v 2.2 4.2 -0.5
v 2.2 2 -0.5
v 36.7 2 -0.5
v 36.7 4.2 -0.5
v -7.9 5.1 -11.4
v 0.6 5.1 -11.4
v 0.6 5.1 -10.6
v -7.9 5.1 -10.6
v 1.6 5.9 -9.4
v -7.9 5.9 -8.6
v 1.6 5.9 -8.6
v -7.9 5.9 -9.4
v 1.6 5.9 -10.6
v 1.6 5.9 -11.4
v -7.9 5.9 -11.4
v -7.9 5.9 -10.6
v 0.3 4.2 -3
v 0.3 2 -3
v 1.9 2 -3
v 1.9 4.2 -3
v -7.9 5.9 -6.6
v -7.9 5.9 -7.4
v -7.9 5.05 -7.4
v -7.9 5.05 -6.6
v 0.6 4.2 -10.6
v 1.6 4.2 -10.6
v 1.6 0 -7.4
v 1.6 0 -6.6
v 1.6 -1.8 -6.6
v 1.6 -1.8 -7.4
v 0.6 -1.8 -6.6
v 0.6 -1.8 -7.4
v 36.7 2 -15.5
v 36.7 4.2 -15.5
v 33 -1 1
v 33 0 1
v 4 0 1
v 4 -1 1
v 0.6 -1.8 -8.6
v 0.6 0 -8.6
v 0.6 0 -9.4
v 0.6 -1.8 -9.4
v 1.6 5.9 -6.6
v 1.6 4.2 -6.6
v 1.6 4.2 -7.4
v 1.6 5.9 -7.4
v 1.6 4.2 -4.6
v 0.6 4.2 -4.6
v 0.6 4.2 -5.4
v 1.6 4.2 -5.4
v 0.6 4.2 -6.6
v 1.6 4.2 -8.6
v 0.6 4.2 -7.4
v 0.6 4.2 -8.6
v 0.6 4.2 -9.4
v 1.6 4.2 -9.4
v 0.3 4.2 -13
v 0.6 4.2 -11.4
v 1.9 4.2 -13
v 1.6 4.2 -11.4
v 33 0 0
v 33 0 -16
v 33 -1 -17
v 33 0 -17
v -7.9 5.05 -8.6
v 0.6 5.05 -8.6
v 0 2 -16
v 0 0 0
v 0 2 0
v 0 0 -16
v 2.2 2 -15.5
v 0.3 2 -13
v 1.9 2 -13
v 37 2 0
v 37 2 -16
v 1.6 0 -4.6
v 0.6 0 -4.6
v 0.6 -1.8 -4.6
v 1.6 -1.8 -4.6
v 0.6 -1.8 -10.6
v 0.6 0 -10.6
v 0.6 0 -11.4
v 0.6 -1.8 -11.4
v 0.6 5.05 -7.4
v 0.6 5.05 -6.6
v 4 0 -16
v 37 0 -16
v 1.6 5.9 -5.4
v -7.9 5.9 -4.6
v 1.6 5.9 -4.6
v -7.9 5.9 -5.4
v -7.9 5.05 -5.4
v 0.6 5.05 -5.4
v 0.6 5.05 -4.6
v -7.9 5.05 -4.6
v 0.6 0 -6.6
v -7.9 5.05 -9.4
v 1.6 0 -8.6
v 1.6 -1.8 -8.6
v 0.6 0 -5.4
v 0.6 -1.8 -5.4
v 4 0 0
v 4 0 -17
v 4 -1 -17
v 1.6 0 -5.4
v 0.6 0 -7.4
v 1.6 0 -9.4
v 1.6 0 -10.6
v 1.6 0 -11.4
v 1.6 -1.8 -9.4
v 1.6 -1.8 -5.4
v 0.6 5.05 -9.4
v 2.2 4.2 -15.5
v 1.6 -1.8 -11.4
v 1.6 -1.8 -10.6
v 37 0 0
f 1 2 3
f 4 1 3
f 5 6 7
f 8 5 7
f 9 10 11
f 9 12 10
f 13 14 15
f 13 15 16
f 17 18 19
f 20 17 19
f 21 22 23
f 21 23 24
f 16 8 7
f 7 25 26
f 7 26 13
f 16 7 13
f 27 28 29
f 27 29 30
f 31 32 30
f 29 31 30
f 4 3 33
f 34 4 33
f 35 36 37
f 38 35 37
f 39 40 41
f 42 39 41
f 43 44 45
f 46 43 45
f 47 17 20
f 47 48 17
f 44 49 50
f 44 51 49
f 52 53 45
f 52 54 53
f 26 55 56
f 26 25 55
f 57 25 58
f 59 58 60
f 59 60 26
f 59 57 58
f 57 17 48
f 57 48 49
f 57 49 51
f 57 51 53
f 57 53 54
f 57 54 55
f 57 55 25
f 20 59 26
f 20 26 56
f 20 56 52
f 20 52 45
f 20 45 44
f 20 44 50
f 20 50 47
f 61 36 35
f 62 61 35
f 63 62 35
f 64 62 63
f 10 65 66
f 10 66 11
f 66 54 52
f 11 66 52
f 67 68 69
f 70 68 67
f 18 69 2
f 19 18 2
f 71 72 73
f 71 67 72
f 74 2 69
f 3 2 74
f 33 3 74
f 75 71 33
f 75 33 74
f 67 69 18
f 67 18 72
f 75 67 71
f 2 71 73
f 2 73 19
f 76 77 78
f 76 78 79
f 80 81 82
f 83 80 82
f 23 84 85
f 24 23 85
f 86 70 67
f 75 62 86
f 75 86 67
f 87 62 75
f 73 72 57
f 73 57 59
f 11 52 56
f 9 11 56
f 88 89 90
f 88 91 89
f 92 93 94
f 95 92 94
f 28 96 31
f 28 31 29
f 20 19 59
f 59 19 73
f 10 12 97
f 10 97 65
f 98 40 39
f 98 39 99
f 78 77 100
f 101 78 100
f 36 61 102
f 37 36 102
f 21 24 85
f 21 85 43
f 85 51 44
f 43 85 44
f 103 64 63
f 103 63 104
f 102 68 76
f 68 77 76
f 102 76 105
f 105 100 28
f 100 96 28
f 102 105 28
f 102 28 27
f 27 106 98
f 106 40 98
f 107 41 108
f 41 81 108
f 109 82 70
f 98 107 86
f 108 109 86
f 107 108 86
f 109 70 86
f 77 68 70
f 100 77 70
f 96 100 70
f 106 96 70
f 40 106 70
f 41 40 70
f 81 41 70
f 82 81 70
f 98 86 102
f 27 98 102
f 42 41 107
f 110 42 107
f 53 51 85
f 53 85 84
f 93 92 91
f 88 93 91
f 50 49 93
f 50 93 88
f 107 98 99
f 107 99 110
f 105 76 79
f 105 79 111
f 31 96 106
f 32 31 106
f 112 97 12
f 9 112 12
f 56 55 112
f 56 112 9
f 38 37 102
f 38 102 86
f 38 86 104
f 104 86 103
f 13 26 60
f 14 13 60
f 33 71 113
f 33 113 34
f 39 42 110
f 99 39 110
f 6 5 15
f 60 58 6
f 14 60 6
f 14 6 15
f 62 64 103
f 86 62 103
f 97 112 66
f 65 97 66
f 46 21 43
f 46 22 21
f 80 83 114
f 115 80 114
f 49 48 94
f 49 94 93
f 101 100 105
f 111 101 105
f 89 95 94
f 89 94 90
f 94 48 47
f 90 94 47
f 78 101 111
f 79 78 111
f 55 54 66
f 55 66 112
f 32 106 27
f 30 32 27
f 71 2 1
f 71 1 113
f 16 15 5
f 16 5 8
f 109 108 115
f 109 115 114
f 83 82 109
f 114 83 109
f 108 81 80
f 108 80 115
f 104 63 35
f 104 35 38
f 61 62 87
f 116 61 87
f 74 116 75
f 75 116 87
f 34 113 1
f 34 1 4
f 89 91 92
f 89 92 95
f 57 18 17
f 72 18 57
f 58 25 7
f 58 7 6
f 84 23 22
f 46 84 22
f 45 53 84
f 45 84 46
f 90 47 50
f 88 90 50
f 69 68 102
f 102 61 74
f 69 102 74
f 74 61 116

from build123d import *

# Parameters (mm, degrees)
SKETCH1_W                = 37
SKETCH1_H                = 16
BOSS_EXTRUDE1_DEPTH      = 2
SKETCH2_W                = 34.5
SKETCH2_H                = 15
BOSS_EXTRUDE2_DEPTH      = 2.2
SKETCH3_W                = 1.6
SKETCH3_H                = 10
BOSS_EXTRUDE3_DEPTH      = 2.2
SKETCH4_W                = 1
SKETCH4_H                = 0.8
BOSS_EXTRUDE4_DEPTH      = 1.7
BOSS_EXTRUDE4_DEPTH_BACK = 6
SKETCH5_W                = 0.8
SKETCH5_H                = 0.8
SKETCH5_H_2              = 0.85
BOSS_EXTRUDE5_DEPTH      = 8.5
SKETCH6_W                = 29
SKETCH6_H                = 18
BOSS_EXTRUDE6_DEPTH      = 1


with BuildPart() as part:
    # Sketch1 → Boss-Extrude1 (new body)
    with BuildSketch(Plane(origin=(0, 0, 0), x_dir=(1, 0, 0), z_dir=(0, 1, 0))):
        with Locations((18.5, 8)):
            Rectangle(SKETCH1_W, SKETCH1_H)
    extrude(amount=BOSS_EXTRUDE1_DEPTH)

    # Sketch2 → Boss-Extrude2 (add)
    with BuildSketch(Plane(origin=(0, 2, 0), x_dir=(1, 0, 0), z_dir=(0, 1, 0))):
        with Locations((19.45, 8)):
            Rectangle(SKETCH2_W, SKETCH2_H)
    extrude(amount=BOSS_EXTRUDE2_DEPTH)

    # Sketch3 → Boss-Extrude3 (add)
    with BuildSketch(Plane(origin=(0, 2, 0), x_dir=(1, 0, 0), z_dir=(0, 1, 0))):
        with Locations((1.1, 8)):
            Rectangle(SKETCH3_W, SKETCH3_H)
    extrude(amount=BOSS_EXTRUDE3_DEPTH)

    # Sketch4 → Boss-Extrude4 (add, two sides)
    with BuildSketch(Plane(origin=(0, 4.2, 0), x_dir=(1, 0, 0), z_dir=(0, 1, 0))) as boss_extrude4_sk:
        with Locations((1.1, 11)):
            Rectangle(SKETCH4_W, SKETCH4_H)
        with Locations((1.1, 9)):
            Rectangle(SKETCH4_W, SKETCH4_H)
        with Locations((1.1, 7)):
            Rectangle(SKETCH4_W, SKETCH4_H)
        with Locations((1.1, 5)):
            Rectangle(SKETCH4_W, SKETCH4_H)
    extrude(amount=BOSS_EXTRUDE4_DEPTH)
    extrude(boss_extrude4_sk.sketch, amount=-BOSS_EXTRUDE4_DEPTH_BACK)

    # Sketch5 → Boss-Extrude5 (add)
    with BuildSketch(Plane.ZY.offset(-0.6)):
        with Locations((-11, 5.5)):
            Rectangle(SKETCH5_W, SKETCH5_H)
        with Locations((-9, 5.475)):
            Rectangle(SKETCH5_W, SKETCH5_H_2)
        with Locations((-7, 5.475)):
            Rectangle(SKETCH5_W, SKETCH5_H_2)
        with Locations((-5, 5.475)):
            Rectangle(SKETCH5_W, SKETCH5_H_2)
    extrude(amount=BOSS_EXTRUDE5_DEPTH)

    # Sketch6 → Boss-Extrude6 (add)
    with BuildSketch(Plane(origin=(0, 0, 0), x_dir=(-1, 0, 0), z_dir=(0, -1, 0))):
        with Locations((-18.5, 8)):
            Rectangle(SKETCH6_W, SKETCH6_H)
    extrude(amount=BOSS_EXTRUDE6_DEPTH)


solid = part.part
